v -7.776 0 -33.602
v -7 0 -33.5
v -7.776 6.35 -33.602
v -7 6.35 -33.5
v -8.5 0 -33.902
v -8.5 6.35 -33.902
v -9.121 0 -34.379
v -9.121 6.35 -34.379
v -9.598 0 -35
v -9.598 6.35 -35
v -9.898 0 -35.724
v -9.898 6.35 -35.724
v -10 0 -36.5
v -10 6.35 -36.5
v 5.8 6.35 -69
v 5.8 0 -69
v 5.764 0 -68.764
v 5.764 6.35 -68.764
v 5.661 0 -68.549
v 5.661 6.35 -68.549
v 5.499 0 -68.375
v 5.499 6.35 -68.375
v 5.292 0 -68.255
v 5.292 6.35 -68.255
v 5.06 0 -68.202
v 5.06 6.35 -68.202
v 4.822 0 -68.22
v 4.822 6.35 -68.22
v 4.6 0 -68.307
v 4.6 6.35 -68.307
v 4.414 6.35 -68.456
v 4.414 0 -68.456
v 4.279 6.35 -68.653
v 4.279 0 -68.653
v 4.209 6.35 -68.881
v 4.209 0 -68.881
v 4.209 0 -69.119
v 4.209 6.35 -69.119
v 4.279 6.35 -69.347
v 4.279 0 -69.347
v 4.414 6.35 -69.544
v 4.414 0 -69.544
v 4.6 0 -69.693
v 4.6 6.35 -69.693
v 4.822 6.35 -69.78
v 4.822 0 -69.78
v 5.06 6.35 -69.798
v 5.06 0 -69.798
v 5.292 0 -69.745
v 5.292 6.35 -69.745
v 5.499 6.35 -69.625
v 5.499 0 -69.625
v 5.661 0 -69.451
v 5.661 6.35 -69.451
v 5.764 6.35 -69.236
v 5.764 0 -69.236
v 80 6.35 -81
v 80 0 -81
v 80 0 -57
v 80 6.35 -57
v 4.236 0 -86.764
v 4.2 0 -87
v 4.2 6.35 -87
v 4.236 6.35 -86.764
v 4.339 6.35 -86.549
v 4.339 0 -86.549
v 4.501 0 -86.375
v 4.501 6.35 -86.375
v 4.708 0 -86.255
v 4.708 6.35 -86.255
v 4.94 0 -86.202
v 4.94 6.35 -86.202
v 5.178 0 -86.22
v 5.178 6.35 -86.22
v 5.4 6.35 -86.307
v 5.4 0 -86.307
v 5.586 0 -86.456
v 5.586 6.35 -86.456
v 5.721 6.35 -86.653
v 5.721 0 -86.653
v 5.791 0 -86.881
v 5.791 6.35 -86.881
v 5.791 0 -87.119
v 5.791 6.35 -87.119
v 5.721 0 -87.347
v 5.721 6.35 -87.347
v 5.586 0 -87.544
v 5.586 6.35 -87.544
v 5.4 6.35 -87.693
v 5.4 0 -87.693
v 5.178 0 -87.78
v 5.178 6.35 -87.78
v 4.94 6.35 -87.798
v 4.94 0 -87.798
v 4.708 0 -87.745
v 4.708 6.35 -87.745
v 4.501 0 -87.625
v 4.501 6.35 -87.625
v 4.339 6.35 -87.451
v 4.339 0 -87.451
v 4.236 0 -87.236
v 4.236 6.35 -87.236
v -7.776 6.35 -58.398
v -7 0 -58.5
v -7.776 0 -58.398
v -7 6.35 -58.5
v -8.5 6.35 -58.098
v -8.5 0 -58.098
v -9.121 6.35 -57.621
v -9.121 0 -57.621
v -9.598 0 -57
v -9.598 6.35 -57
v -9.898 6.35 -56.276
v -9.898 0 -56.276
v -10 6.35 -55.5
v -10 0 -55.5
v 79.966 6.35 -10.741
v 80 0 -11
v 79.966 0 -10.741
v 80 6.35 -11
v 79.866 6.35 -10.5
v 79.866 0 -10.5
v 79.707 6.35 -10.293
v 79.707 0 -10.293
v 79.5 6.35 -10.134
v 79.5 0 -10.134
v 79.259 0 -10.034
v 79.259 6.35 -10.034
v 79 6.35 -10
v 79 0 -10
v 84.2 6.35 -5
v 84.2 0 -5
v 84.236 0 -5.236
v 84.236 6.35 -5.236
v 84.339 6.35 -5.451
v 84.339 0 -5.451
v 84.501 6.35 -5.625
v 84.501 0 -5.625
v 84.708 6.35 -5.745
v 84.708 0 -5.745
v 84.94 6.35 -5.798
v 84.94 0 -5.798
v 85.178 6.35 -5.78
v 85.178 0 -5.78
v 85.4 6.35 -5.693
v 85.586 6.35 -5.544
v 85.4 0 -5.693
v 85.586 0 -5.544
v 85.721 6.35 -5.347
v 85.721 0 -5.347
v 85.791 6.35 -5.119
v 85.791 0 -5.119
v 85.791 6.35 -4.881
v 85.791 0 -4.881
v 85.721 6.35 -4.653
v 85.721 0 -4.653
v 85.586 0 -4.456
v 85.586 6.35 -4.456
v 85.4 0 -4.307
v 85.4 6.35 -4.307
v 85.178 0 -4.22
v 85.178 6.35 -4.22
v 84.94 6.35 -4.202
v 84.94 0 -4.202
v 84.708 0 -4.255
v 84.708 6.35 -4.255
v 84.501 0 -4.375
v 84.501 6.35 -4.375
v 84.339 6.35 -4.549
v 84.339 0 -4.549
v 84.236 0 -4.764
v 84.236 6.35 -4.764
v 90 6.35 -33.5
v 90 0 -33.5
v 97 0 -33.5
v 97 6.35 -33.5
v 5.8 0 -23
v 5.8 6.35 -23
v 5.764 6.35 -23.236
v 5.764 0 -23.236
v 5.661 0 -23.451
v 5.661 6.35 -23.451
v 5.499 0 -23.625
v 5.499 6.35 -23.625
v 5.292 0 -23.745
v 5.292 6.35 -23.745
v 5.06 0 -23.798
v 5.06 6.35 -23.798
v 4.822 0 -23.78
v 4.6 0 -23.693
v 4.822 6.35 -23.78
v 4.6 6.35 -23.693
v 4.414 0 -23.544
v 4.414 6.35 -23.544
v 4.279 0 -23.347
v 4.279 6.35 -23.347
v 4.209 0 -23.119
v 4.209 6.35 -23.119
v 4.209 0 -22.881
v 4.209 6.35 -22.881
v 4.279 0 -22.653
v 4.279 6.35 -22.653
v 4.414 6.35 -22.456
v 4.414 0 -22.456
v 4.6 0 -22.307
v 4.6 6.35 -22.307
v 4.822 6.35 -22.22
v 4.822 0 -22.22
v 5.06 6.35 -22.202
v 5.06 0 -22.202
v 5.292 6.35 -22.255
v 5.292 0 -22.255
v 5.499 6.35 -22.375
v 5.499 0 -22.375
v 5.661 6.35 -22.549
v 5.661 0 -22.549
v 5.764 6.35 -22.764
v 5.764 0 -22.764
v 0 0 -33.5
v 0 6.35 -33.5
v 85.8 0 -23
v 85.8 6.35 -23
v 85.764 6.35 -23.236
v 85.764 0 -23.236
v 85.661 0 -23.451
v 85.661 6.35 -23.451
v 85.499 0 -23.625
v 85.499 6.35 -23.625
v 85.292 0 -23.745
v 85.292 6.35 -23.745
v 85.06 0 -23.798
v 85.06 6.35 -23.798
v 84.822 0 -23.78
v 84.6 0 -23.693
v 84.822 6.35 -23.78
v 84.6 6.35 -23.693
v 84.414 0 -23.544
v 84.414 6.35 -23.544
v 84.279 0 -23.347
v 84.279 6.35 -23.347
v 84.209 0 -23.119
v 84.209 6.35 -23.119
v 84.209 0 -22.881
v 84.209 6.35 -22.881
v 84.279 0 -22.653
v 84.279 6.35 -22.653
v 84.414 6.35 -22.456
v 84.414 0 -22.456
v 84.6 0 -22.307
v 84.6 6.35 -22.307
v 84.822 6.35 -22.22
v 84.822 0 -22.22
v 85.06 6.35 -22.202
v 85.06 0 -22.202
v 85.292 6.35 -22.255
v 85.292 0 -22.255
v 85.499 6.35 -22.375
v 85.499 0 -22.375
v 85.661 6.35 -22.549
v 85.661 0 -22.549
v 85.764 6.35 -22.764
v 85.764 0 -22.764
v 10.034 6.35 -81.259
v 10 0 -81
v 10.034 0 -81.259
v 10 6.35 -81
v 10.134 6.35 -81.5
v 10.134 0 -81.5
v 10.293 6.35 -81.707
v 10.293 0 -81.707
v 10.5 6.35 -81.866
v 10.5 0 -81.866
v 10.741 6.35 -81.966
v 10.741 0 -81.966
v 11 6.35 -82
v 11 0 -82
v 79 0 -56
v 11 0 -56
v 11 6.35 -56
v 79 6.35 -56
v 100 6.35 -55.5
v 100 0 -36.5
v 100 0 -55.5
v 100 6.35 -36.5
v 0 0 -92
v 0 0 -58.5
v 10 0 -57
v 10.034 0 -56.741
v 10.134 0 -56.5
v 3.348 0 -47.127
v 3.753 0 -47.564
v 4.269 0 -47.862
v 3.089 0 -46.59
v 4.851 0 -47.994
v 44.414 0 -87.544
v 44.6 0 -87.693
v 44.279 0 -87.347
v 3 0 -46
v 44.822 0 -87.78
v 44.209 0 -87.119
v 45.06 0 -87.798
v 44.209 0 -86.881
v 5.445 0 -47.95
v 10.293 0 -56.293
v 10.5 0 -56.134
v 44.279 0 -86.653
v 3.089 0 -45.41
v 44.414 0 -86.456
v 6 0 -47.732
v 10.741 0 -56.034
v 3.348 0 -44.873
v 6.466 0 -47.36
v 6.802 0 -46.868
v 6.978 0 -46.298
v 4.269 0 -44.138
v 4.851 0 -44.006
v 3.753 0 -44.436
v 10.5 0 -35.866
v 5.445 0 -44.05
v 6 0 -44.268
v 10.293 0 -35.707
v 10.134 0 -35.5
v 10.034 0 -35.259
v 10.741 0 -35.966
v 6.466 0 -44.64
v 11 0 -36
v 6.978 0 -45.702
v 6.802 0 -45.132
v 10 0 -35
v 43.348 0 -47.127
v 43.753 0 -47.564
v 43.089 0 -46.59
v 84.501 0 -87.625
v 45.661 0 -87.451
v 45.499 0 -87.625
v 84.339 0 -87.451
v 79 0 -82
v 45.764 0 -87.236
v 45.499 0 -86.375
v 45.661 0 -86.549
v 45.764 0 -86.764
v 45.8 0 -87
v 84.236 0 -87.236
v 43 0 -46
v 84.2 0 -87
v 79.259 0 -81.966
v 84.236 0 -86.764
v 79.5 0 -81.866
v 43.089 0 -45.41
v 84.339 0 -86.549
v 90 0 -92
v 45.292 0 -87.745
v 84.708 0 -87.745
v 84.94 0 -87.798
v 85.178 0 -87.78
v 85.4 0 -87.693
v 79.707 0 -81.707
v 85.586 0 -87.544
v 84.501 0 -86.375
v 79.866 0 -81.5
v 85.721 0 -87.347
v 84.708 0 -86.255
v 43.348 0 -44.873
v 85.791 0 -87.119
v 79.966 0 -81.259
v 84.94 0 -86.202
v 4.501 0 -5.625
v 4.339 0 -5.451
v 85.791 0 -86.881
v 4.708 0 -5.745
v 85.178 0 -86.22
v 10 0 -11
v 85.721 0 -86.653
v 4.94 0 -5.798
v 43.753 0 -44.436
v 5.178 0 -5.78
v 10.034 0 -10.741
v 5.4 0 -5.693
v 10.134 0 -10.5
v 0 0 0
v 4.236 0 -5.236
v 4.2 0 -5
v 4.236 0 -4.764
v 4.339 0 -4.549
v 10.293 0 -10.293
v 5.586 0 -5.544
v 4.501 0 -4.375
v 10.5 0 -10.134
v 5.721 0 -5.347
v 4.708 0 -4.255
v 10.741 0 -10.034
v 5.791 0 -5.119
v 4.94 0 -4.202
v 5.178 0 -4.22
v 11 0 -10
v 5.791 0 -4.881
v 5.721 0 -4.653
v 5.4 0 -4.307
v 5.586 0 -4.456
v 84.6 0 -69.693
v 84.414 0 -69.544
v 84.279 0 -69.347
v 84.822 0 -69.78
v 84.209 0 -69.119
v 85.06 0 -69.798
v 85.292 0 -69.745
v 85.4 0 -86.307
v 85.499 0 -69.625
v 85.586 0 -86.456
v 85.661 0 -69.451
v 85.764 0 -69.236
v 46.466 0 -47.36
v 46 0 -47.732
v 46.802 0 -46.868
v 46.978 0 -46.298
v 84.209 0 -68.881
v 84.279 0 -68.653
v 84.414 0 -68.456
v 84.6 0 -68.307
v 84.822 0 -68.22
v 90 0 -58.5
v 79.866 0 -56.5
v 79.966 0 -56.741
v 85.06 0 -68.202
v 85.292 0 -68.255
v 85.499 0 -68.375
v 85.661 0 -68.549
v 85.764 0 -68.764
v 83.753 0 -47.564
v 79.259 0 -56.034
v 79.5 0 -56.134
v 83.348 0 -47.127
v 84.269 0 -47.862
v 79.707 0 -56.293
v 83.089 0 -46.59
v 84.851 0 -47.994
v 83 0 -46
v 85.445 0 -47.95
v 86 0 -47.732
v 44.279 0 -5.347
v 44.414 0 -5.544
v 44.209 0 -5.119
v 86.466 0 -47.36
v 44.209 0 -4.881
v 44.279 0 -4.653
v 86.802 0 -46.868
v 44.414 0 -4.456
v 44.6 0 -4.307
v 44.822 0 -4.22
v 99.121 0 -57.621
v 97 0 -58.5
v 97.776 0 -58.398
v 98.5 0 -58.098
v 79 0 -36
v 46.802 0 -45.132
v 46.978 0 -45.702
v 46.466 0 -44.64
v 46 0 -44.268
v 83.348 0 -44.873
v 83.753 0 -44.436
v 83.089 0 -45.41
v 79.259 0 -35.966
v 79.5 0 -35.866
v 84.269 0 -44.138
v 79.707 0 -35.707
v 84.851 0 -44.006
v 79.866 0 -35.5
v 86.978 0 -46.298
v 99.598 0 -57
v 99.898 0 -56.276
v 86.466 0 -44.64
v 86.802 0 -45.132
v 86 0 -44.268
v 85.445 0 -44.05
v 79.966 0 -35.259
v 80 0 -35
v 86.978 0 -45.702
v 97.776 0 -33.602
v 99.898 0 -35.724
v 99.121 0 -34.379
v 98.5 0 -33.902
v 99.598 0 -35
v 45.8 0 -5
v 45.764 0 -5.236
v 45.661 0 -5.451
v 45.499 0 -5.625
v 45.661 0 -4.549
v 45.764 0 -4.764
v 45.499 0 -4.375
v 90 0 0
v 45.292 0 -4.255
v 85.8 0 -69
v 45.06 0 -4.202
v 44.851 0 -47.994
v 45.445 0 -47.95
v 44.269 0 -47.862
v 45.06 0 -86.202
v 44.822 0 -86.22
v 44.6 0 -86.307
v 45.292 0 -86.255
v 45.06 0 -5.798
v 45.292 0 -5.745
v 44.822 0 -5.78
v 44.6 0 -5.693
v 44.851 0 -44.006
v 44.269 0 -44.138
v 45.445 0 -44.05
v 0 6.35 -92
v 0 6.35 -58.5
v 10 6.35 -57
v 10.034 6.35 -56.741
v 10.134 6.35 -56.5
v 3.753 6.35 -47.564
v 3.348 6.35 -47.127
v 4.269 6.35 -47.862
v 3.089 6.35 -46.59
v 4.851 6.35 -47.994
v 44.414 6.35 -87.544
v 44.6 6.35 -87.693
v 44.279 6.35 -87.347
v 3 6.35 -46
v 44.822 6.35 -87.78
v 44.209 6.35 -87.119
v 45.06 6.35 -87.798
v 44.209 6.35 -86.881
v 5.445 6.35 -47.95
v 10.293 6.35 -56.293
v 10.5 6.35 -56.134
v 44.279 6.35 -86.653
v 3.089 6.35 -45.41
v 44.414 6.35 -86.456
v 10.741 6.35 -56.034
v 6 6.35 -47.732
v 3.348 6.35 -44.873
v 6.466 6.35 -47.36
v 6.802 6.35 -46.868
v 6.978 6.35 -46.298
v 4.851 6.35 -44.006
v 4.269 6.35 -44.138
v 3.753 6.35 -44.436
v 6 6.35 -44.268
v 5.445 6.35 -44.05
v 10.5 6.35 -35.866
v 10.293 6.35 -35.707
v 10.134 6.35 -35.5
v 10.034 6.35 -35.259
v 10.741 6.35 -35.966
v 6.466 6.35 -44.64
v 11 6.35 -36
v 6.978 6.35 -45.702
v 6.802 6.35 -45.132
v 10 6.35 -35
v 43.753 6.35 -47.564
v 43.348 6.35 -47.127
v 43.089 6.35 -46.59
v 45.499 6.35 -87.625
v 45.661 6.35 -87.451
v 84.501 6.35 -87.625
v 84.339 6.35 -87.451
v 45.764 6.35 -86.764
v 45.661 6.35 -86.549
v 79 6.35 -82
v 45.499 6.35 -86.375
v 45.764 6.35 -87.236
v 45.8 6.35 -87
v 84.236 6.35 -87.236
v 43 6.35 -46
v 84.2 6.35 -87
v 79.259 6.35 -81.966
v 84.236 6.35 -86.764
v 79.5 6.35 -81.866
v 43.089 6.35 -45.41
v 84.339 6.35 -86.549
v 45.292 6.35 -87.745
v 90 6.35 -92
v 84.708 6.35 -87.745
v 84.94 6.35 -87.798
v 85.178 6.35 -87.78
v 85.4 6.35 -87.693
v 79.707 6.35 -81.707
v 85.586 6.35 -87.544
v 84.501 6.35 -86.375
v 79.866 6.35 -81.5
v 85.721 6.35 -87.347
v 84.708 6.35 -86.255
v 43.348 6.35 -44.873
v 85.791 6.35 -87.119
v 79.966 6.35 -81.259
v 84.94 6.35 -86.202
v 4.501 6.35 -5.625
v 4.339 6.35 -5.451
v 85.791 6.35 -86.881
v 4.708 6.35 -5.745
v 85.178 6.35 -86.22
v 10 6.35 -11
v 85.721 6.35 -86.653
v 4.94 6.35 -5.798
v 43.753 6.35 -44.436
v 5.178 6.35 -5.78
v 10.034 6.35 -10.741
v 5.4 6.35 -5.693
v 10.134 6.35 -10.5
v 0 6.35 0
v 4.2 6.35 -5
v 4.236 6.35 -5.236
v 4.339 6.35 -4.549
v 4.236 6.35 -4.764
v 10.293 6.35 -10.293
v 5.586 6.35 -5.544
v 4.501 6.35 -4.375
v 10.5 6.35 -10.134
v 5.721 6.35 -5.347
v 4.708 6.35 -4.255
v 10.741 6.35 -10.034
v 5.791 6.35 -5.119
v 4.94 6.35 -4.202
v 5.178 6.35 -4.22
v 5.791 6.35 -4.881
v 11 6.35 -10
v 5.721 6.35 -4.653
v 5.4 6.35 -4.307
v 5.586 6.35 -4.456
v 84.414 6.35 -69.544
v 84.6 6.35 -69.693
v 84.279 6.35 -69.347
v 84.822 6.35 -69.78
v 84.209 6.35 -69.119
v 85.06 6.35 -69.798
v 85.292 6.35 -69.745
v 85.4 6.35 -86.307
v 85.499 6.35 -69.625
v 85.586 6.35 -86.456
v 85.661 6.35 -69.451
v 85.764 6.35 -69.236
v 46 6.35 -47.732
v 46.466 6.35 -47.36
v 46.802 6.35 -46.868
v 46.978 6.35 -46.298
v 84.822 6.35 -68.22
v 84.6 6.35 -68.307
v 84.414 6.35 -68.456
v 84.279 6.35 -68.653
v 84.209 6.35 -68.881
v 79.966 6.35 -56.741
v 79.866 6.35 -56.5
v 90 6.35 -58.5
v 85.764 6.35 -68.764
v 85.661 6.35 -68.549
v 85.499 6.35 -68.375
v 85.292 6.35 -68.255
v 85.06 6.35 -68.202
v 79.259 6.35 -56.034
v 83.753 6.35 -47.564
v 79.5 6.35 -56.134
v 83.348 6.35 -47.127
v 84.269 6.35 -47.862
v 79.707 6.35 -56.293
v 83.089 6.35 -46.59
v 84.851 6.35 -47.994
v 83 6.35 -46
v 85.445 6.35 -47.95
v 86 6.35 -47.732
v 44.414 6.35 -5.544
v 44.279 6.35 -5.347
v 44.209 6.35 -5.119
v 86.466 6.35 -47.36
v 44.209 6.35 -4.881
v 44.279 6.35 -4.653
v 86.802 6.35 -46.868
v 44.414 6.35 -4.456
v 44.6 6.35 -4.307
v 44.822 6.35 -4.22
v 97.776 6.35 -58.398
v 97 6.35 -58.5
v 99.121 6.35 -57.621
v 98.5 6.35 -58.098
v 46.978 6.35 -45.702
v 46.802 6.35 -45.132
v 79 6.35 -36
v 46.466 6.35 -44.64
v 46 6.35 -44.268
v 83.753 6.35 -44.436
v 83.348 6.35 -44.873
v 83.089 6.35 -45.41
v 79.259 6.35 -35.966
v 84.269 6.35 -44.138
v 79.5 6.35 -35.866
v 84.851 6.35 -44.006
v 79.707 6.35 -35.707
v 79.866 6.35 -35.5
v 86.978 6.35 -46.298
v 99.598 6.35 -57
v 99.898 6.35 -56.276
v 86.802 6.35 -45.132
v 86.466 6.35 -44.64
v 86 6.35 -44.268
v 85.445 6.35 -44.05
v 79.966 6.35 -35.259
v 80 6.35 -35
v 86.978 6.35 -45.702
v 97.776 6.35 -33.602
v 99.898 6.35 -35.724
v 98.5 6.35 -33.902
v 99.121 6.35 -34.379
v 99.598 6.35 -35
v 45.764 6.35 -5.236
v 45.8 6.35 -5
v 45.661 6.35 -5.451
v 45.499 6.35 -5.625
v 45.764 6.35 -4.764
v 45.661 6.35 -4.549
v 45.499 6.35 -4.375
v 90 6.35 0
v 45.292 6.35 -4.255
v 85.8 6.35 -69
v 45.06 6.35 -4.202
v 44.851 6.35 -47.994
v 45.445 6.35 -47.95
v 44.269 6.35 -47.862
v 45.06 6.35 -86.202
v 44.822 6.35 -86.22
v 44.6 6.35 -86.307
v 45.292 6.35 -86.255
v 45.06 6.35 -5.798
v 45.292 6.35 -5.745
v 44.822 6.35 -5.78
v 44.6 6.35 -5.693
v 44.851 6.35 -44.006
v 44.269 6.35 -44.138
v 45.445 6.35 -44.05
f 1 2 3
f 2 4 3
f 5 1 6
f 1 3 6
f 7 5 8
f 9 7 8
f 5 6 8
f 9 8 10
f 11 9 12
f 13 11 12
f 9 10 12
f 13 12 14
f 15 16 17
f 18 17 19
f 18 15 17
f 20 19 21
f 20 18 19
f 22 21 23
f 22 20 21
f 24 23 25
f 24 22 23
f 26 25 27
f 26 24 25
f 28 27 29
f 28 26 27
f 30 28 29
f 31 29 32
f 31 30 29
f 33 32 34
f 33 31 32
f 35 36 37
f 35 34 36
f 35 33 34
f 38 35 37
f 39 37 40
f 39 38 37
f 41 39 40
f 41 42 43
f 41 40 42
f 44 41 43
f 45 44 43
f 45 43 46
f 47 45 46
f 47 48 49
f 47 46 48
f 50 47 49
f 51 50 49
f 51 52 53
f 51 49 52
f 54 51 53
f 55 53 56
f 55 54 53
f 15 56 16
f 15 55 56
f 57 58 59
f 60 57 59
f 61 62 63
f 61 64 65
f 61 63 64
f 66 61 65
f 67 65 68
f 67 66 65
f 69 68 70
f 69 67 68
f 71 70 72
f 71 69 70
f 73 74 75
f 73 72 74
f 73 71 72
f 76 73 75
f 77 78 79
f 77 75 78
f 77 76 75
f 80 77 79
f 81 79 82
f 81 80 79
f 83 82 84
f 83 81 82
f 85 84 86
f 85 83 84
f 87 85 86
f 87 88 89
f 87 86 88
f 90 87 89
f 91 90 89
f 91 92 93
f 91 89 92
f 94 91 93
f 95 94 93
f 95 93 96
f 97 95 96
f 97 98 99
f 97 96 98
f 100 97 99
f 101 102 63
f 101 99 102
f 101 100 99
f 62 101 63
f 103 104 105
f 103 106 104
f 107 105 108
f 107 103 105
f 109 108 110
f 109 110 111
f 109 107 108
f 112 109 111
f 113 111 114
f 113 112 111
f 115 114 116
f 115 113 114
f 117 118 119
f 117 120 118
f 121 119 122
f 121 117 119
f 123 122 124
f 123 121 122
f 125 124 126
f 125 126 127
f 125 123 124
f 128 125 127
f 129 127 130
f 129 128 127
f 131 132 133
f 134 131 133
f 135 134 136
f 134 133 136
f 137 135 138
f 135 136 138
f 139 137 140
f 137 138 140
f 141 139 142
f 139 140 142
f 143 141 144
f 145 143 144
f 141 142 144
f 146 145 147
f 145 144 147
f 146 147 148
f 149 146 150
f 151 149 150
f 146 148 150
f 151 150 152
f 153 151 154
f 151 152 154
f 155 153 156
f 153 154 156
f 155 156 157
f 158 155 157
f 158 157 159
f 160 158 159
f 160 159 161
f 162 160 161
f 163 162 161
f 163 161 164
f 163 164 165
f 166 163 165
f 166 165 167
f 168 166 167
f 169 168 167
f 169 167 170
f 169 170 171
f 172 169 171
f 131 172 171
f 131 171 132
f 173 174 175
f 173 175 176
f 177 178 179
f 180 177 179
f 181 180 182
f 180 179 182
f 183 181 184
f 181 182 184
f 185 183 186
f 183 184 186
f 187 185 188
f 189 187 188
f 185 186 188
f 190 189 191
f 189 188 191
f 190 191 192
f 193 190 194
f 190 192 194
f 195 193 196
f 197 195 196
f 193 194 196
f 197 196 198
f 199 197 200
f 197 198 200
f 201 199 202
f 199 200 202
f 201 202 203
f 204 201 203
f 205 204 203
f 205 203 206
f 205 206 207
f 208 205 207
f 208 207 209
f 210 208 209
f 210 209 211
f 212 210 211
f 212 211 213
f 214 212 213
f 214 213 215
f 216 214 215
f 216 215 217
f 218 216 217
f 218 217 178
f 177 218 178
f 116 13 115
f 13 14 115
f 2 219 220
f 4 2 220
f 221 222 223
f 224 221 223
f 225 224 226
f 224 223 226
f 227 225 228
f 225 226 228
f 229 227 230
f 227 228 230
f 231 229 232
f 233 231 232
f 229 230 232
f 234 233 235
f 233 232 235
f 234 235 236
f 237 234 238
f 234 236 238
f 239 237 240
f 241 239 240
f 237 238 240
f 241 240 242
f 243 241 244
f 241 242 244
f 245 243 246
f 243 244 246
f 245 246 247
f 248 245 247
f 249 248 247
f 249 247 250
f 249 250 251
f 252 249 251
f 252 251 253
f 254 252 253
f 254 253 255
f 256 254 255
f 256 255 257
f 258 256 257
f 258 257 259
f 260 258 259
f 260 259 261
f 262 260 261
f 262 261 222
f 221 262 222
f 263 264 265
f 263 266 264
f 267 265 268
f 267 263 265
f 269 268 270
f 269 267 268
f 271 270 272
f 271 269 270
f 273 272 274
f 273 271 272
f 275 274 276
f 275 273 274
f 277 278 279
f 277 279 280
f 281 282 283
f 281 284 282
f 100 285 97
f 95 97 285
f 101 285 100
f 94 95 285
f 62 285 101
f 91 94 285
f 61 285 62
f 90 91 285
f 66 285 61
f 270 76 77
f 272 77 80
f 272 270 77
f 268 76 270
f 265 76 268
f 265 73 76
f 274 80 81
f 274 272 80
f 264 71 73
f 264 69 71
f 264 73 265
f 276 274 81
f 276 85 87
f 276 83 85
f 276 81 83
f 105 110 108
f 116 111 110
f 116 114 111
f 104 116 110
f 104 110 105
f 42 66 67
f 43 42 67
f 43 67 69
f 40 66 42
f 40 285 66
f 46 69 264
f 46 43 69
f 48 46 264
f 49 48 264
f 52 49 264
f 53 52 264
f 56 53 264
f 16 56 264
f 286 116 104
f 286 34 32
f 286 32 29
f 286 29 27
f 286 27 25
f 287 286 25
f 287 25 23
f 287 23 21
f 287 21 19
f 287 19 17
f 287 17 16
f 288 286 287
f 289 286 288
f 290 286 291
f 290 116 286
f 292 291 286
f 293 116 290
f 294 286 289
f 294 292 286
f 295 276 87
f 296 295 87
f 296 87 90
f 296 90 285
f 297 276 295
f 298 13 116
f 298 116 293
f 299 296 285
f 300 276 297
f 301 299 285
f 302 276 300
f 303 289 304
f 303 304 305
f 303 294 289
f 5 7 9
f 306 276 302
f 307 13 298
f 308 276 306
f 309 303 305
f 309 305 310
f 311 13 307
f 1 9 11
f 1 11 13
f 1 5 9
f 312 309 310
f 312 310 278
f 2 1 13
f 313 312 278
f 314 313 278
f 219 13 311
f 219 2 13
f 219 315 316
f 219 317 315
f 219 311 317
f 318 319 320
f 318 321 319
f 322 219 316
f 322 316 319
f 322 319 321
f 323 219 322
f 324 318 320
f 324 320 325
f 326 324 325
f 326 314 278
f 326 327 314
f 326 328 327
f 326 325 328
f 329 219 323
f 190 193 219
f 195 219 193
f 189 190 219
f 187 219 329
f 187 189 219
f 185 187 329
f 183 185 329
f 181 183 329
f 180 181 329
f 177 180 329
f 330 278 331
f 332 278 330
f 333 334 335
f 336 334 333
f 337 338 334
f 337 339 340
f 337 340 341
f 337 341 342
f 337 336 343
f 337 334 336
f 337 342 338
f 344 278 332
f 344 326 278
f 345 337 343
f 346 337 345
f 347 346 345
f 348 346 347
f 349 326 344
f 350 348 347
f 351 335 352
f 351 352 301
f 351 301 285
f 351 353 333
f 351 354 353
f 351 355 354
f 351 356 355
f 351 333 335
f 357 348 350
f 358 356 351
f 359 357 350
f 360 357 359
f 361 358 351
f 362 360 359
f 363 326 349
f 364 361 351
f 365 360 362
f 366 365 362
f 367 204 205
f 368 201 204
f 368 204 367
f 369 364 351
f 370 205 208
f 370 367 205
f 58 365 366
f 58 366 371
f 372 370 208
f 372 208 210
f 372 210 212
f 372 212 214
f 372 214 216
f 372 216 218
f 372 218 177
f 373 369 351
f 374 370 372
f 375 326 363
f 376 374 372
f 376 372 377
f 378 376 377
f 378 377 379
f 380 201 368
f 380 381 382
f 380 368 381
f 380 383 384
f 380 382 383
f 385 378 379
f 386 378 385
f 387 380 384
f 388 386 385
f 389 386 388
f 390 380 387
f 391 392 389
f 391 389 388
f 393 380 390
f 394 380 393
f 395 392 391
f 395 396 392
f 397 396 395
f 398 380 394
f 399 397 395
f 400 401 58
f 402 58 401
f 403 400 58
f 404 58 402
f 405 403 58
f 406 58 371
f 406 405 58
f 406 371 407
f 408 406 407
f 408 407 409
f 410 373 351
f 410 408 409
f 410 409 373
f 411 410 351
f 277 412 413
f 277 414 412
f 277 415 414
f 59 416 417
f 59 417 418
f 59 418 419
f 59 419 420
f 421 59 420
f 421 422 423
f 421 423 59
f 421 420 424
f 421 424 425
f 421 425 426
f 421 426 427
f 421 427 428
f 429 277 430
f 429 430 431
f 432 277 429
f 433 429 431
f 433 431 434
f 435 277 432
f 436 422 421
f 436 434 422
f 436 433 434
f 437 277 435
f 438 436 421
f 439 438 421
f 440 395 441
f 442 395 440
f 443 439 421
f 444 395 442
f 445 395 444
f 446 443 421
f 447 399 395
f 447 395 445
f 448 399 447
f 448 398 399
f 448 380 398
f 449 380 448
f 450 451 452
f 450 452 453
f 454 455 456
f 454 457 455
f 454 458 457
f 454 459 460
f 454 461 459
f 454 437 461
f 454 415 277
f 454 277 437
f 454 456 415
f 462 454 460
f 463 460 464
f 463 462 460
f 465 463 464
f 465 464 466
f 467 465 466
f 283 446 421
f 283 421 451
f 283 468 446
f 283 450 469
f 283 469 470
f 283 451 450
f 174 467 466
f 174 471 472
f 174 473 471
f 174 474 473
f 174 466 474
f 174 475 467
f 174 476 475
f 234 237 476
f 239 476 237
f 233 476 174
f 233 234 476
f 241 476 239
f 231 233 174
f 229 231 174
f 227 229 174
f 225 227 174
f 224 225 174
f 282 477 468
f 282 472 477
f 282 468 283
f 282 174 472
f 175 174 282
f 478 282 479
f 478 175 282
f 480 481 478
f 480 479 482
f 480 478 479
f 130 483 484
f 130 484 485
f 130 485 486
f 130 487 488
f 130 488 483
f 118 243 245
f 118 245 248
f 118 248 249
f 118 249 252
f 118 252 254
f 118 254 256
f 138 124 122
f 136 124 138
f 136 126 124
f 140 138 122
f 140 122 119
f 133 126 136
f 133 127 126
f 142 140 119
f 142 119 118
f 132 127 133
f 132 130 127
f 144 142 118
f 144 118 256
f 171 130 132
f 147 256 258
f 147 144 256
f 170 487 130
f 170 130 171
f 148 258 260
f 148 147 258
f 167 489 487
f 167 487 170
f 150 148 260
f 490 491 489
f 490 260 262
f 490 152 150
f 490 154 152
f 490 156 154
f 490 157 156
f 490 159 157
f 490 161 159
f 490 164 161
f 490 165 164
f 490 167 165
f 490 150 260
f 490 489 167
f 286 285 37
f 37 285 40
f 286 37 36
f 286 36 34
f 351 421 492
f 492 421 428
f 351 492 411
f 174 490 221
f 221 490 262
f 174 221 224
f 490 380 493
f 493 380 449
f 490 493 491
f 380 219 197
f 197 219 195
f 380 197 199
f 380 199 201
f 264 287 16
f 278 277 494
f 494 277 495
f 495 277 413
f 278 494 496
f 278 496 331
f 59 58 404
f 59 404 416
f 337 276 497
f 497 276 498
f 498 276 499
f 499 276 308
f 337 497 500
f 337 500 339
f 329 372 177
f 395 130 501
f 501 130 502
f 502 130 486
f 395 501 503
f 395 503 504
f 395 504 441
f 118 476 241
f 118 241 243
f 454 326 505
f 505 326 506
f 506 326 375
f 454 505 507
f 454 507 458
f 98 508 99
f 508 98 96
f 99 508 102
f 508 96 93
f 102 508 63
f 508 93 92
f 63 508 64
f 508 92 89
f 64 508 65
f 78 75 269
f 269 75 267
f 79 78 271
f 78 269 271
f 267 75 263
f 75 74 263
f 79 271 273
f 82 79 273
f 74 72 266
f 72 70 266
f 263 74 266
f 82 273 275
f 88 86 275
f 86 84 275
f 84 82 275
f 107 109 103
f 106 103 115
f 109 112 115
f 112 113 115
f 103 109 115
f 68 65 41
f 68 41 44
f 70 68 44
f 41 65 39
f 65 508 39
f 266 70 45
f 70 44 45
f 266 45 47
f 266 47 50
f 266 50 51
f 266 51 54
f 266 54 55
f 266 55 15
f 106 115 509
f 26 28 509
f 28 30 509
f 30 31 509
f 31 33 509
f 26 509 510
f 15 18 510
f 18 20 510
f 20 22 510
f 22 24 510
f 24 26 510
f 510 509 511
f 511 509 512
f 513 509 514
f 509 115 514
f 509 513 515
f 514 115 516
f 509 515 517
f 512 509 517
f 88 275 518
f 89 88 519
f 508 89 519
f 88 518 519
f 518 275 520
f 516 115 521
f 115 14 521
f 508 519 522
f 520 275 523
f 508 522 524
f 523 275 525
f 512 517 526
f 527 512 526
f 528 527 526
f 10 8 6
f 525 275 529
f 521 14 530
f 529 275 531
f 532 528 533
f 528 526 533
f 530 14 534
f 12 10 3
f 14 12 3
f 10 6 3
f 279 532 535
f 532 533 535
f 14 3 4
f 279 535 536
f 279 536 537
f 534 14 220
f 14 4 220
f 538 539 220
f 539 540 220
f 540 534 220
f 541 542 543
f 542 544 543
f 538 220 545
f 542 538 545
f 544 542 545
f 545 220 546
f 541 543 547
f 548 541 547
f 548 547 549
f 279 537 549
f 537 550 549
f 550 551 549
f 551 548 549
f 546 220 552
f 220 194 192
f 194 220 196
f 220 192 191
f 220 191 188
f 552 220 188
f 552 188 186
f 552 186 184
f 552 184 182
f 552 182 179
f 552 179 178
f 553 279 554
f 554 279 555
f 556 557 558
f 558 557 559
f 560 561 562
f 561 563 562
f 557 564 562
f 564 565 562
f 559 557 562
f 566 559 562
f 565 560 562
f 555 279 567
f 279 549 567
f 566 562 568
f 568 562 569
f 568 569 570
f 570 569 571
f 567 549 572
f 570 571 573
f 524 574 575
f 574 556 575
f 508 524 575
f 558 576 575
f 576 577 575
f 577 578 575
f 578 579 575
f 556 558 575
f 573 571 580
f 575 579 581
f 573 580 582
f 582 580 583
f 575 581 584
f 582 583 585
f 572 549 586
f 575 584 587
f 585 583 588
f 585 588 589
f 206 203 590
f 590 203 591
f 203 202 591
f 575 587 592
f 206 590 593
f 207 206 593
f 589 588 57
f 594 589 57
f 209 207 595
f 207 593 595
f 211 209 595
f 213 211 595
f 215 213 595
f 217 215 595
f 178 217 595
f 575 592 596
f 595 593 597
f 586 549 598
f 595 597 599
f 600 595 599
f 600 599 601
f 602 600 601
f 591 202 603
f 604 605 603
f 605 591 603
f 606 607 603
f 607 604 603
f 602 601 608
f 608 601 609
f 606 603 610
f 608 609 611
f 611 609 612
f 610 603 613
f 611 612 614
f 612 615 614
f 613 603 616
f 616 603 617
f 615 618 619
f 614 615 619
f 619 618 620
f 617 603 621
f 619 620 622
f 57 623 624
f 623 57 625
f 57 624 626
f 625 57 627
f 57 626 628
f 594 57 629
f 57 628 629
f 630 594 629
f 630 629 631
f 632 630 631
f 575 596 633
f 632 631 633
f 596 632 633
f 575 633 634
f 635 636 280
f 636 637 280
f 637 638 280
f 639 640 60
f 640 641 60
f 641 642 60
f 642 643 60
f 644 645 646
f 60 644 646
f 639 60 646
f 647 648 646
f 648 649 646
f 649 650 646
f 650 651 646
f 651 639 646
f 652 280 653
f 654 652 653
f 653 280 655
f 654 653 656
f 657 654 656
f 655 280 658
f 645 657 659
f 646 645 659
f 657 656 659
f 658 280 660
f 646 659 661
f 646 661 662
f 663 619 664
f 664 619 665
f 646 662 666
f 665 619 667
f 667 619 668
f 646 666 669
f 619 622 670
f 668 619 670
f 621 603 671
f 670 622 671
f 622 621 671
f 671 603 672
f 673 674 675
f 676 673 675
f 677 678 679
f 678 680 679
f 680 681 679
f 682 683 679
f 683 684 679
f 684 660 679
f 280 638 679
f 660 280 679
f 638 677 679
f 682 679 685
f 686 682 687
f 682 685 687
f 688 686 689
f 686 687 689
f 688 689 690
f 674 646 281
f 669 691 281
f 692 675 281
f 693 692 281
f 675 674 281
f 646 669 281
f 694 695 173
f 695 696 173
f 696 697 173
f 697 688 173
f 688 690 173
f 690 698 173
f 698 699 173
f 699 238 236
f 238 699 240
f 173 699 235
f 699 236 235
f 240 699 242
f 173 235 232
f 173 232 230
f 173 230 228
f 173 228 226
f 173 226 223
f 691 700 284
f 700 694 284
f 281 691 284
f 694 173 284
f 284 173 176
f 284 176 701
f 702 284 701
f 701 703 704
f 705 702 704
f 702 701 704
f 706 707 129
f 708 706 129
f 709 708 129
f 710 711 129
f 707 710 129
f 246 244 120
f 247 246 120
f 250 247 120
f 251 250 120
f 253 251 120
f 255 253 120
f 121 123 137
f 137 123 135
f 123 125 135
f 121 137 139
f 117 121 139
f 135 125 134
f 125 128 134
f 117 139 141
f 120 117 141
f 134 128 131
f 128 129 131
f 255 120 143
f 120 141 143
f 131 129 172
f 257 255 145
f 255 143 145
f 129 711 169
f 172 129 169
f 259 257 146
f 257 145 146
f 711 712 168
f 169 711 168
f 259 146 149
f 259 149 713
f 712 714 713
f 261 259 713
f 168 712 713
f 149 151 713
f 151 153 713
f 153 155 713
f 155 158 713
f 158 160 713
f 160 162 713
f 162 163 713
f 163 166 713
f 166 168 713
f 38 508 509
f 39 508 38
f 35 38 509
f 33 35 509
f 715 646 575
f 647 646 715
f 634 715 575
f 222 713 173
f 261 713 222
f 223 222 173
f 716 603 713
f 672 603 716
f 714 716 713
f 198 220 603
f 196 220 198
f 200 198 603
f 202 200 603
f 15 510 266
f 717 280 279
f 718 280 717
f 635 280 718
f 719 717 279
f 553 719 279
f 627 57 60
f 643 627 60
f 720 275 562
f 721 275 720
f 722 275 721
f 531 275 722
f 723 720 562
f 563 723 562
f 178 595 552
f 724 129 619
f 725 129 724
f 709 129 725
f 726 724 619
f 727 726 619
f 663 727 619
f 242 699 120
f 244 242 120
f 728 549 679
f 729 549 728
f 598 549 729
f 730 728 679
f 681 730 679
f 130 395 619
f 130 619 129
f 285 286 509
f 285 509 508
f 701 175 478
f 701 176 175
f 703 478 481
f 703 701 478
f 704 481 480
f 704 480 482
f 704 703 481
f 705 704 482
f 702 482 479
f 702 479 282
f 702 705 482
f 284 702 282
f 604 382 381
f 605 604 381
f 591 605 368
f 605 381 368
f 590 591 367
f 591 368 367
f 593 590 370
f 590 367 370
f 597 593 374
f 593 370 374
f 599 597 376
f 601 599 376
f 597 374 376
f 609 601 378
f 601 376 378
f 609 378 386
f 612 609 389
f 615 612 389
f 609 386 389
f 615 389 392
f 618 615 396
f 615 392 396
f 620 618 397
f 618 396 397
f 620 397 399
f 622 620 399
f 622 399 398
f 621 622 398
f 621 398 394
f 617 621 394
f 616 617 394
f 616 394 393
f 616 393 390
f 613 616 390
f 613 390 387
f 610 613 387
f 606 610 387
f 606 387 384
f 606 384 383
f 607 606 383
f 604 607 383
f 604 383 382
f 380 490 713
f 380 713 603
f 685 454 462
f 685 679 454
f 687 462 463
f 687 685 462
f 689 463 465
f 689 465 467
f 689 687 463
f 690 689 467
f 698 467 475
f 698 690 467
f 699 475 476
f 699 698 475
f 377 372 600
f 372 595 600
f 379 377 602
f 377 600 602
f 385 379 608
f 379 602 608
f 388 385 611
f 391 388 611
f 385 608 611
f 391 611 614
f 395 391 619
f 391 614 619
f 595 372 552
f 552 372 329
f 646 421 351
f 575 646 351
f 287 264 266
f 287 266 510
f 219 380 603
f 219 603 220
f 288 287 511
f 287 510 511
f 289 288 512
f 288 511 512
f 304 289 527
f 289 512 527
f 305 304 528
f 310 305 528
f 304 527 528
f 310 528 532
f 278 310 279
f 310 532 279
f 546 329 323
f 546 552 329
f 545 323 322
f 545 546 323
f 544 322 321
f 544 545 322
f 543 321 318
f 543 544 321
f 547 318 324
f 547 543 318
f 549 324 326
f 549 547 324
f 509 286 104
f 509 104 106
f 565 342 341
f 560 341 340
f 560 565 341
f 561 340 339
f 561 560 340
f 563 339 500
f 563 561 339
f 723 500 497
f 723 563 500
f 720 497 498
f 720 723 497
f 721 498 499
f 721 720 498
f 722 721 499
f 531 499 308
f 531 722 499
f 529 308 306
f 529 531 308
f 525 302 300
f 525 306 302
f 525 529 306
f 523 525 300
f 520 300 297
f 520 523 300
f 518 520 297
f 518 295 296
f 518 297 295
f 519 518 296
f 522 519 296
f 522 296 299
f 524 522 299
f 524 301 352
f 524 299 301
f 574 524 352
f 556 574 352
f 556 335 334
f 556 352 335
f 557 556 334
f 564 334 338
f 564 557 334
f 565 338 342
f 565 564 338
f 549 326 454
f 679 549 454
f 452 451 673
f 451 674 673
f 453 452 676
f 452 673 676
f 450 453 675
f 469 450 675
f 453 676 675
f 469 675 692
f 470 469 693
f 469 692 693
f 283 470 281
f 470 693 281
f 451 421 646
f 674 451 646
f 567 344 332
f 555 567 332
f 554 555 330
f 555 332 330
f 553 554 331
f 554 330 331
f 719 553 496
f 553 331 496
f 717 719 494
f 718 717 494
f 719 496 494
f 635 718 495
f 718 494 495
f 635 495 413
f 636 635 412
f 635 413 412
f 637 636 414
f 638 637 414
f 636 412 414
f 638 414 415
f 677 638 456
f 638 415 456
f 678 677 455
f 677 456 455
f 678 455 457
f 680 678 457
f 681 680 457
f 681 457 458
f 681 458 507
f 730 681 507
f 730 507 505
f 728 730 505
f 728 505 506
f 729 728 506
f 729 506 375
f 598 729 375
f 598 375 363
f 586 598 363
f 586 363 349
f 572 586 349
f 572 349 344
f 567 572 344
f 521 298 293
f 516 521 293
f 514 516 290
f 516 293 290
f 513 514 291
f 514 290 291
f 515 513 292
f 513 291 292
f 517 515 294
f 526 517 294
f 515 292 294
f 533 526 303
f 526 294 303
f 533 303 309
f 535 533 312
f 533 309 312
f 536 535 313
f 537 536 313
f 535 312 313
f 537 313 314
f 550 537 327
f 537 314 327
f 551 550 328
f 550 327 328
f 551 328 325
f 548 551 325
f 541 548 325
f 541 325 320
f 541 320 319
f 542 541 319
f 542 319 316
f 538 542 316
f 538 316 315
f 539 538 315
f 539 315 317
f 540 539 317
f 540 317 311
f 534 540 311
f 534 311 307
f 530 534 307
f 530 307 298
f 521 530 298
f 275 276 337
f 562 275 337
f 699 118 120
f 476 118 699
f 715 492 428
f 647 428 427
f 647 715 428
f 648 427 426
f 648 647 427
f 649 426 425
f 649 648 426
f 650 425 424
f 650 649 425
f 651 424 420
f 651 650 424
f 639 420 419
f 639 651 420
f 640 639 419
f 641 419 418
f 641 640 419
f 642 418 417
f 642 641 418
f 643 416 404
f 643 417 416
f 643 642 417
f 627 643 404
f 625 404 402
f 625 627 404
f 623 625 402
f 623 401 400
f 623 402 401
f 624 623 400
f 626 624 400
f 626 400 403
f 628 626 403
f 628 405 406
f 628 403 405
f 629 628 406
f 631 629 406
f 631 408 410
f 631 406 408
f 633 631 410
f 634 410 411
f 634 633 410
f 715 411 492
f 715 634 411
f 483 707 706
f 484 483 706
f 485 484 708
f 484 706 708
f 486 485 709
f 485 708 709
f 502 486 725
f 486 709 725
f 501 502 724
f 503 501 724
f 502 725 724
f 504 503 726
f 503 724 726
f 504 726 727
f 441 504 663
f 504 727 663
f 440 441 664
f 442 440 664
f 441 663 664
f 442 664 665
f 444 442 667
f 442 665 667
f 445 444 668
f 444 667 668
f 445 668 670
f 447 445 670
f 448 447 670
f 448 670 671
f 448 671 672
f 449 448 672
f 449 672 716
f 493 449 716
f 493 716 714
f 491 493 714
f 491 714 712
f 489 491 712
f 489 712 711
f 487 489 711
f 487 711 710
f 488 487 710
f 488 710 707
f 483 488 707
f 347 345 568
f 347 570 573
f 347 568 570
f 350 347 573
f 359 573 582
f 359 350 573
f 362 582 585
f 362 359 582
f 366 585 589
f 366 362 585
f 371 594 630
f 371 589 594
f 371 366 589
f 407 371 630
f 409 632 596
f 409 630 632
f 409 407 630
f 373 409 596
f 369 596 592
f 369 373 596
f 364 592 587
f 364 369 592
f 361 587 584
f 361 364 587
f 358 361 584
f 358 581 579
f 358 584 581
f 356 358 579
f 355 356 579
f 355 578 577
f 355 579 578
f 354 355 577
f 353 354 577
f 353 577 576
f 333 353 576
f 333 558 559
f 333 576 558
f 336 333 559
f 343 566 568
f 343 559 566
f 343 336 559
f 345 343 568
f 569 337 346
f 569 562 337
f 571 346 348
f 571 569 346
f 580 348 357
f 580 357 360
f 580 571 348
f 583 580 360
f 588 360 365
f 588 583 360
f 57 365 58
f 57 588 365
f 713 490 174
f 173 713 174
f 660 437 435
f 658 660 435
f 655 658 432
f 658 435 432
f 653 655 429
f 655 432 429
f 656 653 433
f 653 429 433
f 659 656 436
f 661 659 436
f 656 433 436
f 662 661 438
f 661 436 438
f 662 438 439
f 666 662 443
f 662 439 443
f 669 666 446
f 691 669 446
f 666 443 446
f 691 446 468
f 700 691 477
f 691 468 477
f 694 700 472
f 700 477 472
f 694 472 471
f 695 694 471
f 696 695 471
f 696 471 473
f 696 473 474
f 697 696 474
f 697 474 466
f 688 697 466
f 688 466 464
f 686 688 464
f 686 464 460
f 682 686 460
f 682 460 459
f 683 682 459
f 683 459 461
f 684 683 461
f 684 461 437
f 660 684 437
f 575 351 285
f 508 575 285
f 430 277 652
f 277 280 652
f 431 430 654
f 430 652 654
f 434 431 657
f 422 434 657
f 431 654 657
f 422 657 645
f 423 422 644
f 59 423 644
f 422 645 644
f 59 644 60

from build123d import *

# Parameters (mm, degrees)
BOSS_EXTRUDE1_DEPTH         = 6.35
FILLET1_R                   = 1
TAP_DRILL_FOR_M2X0_4_TAP1_D = 1.6
SKETCH7_R                   = 0.8
CUT_EXTRUDE1_DEPTH          = 7.35
FILLET1_OF_MIRROR1_R        = 1
SKETCH6_W                   = 25
SKETCH6_H                   = 6.35
BOSS_EXTRUDE2_DEPTH         = 10
FILLET2_R                   = 3
FILLET2_OF_MIRROR2_R        = 3
SKETCH8_R                   = 2
CUT_EXTRUDE2_DEPTH          = 10


with BuildPart() as part:
    # Sketch1 → Boss-Extrude1 (new body)
    with BuildSketch(Plane(origin=(0, 0, 0), x_dir=(1, 0, 0), z_dir=(0, 1, 0))):
        Polygon((10, 10), (10, 36), (0, 46), (0, 0), align=None)
        Polygon((10, 36), (80, 36), (90, 46), (0, 46), align=None)
        Polygon((80, 10), (90, 0), (0, 0), (10, 10), align=None)
        Polygon((80, 10), (80, 36), (90, 46), (90, 0), align=None)
    boss_extrude1 = extrude(amount=BOSS_EXTRUDE1_DEPTH)

    # Fillet1
    fillet1_edges = [part.edges().sort_by_distance(p)[0] for p in [
        (10, 3.175, -10),
        (80, 3.175, -10),
        (80, 3.175, -36),
        (10, 3.175, -36),
    ]]
    fillet(fillet1_edges, radius=FILLET1_R)

    # Tap Drill for M2x0.4 Tap1 (through all)
    with Locations(Plane(origin=(0, 6.35, 0), x_dir=(1, 0, 0), z_dir=(0, 1, 0))):
        with Locations((85, 5), (5, 5)):
            tap_drill_for_m2x0_4_tap1 = Hole(TAP_DRILL_FOR_M2X0_4_TAP1_D / 2)

    # Sketch7 → Cut-Extrude1 (cut, through all)
    with BuildSketch(Plane(origin=(0, 6.35, 0), x_dir=(1, 0, 0), z_dir=(0, 1, 0))):
        with Locations((85, 23)):
            Circle(SKETCH7_R)
        with Locations((45, 5)):
            Circle(SKETCH7_R)
        with Locations((5, 23)):
            Circle(SKETCH7_R)
    cut_extrude1 = extrude(amount=-CUT_EXTRUDE1_DEPTH, mode=Mode.SUBTRACT)

    # Mirror1: Boss-Extrude1, Tap Drill for M2x0.4 Tap1 across plane
    add(boss_extrude1.mirror(Plane(origin=(0, 0, -46), x_dir=(1, 0, 0), z_dir=(0, 0, -1))))
    add(tap_drill_for_m2x0_4_tap1.mirror(Plane(origin=(0, 0, -46), x_dir=(1, 0, 0), z_dir=(0, 0, -1))), mode=Mode.SUBTRACT)

    # Fillet1 of Mirror1
    fillet1_of_mirror1_edges = [part.edges().sort_by_distance(p)[0] for p in [
        (10, 3.175, -82),
        (80, 3.175, -82),
        (80, 3.175, -56),
        (10, 3.175, -56),
    ]]
    fillet(fillet1_of_mirror1_edges, radius=FILLET1_OF_MIRROR1_R)

    # Sketch6 → Boss-Extrude2 (add)
    with BuildSketch(Plane(origin=(90, 0, 0), x_dir=(0, 0, -1), z_dir=(1, 0, 0))):
        with Locations((46, 3.175)):
            Rectangle(SKETCH6_W, SKETCH6_H)
    boss_extrude2 = extrude(amount=BOSS_EXTRUDE2_DEPTH)

    # Fillet2
    fillet2_edges = [part.edges().sort_by_distance(p)[0] for p in [
        (100, 3.175, -58.5),
        (100, 3.175, -33.5),
    ]]
    fillet(fillet2_edges, radius=FILLET2_R)

    # Mirror2: Boss-Extrude2 across plane
    add(boss_extrude2.mirror(Plane.ZY.offset(-45)))

    # Fillet2 of Mirror2
    fillet2_of_mirror2_edges = [part.edges().sort_by_distance(p)[0] for p in [
        (-10, 3.175, -58.5),
        (-10, 3.175, -33.5),
    ]]
    fillet(fillet2_of_mirror2_edges, radius=FILLET2_OF_MIRROR2_R)

    # Mirror3: Cut-Extrude1 across plane
    add(cut_extrude1.mirror(Plane(origin=(0, 0, -46), x_dir=(1, 0, 0), z_dir=(0, 0, -1))), mode=Mode.SUBTRACT)

    # Sketch8 → Cut-Extrude2 (cut)
    with BuildSketch(Plane(origin=(0, 0, 0), x_dir=(-1, 0, 0), z_dir=(0, -1, 0))):
        with Locations((-45, 46)):
            Circle(SKETCH8_R)
        with Locations((-85, 46)):
            Circle(SKETCH8_R)
        with Locations((-5, 46)):
            Circle(SKETCH8_R)
    extrude(amount=-CUT_EXTRUDE2_DEPTH, mode=Mode.SUBTRACT)


solid = part.part
